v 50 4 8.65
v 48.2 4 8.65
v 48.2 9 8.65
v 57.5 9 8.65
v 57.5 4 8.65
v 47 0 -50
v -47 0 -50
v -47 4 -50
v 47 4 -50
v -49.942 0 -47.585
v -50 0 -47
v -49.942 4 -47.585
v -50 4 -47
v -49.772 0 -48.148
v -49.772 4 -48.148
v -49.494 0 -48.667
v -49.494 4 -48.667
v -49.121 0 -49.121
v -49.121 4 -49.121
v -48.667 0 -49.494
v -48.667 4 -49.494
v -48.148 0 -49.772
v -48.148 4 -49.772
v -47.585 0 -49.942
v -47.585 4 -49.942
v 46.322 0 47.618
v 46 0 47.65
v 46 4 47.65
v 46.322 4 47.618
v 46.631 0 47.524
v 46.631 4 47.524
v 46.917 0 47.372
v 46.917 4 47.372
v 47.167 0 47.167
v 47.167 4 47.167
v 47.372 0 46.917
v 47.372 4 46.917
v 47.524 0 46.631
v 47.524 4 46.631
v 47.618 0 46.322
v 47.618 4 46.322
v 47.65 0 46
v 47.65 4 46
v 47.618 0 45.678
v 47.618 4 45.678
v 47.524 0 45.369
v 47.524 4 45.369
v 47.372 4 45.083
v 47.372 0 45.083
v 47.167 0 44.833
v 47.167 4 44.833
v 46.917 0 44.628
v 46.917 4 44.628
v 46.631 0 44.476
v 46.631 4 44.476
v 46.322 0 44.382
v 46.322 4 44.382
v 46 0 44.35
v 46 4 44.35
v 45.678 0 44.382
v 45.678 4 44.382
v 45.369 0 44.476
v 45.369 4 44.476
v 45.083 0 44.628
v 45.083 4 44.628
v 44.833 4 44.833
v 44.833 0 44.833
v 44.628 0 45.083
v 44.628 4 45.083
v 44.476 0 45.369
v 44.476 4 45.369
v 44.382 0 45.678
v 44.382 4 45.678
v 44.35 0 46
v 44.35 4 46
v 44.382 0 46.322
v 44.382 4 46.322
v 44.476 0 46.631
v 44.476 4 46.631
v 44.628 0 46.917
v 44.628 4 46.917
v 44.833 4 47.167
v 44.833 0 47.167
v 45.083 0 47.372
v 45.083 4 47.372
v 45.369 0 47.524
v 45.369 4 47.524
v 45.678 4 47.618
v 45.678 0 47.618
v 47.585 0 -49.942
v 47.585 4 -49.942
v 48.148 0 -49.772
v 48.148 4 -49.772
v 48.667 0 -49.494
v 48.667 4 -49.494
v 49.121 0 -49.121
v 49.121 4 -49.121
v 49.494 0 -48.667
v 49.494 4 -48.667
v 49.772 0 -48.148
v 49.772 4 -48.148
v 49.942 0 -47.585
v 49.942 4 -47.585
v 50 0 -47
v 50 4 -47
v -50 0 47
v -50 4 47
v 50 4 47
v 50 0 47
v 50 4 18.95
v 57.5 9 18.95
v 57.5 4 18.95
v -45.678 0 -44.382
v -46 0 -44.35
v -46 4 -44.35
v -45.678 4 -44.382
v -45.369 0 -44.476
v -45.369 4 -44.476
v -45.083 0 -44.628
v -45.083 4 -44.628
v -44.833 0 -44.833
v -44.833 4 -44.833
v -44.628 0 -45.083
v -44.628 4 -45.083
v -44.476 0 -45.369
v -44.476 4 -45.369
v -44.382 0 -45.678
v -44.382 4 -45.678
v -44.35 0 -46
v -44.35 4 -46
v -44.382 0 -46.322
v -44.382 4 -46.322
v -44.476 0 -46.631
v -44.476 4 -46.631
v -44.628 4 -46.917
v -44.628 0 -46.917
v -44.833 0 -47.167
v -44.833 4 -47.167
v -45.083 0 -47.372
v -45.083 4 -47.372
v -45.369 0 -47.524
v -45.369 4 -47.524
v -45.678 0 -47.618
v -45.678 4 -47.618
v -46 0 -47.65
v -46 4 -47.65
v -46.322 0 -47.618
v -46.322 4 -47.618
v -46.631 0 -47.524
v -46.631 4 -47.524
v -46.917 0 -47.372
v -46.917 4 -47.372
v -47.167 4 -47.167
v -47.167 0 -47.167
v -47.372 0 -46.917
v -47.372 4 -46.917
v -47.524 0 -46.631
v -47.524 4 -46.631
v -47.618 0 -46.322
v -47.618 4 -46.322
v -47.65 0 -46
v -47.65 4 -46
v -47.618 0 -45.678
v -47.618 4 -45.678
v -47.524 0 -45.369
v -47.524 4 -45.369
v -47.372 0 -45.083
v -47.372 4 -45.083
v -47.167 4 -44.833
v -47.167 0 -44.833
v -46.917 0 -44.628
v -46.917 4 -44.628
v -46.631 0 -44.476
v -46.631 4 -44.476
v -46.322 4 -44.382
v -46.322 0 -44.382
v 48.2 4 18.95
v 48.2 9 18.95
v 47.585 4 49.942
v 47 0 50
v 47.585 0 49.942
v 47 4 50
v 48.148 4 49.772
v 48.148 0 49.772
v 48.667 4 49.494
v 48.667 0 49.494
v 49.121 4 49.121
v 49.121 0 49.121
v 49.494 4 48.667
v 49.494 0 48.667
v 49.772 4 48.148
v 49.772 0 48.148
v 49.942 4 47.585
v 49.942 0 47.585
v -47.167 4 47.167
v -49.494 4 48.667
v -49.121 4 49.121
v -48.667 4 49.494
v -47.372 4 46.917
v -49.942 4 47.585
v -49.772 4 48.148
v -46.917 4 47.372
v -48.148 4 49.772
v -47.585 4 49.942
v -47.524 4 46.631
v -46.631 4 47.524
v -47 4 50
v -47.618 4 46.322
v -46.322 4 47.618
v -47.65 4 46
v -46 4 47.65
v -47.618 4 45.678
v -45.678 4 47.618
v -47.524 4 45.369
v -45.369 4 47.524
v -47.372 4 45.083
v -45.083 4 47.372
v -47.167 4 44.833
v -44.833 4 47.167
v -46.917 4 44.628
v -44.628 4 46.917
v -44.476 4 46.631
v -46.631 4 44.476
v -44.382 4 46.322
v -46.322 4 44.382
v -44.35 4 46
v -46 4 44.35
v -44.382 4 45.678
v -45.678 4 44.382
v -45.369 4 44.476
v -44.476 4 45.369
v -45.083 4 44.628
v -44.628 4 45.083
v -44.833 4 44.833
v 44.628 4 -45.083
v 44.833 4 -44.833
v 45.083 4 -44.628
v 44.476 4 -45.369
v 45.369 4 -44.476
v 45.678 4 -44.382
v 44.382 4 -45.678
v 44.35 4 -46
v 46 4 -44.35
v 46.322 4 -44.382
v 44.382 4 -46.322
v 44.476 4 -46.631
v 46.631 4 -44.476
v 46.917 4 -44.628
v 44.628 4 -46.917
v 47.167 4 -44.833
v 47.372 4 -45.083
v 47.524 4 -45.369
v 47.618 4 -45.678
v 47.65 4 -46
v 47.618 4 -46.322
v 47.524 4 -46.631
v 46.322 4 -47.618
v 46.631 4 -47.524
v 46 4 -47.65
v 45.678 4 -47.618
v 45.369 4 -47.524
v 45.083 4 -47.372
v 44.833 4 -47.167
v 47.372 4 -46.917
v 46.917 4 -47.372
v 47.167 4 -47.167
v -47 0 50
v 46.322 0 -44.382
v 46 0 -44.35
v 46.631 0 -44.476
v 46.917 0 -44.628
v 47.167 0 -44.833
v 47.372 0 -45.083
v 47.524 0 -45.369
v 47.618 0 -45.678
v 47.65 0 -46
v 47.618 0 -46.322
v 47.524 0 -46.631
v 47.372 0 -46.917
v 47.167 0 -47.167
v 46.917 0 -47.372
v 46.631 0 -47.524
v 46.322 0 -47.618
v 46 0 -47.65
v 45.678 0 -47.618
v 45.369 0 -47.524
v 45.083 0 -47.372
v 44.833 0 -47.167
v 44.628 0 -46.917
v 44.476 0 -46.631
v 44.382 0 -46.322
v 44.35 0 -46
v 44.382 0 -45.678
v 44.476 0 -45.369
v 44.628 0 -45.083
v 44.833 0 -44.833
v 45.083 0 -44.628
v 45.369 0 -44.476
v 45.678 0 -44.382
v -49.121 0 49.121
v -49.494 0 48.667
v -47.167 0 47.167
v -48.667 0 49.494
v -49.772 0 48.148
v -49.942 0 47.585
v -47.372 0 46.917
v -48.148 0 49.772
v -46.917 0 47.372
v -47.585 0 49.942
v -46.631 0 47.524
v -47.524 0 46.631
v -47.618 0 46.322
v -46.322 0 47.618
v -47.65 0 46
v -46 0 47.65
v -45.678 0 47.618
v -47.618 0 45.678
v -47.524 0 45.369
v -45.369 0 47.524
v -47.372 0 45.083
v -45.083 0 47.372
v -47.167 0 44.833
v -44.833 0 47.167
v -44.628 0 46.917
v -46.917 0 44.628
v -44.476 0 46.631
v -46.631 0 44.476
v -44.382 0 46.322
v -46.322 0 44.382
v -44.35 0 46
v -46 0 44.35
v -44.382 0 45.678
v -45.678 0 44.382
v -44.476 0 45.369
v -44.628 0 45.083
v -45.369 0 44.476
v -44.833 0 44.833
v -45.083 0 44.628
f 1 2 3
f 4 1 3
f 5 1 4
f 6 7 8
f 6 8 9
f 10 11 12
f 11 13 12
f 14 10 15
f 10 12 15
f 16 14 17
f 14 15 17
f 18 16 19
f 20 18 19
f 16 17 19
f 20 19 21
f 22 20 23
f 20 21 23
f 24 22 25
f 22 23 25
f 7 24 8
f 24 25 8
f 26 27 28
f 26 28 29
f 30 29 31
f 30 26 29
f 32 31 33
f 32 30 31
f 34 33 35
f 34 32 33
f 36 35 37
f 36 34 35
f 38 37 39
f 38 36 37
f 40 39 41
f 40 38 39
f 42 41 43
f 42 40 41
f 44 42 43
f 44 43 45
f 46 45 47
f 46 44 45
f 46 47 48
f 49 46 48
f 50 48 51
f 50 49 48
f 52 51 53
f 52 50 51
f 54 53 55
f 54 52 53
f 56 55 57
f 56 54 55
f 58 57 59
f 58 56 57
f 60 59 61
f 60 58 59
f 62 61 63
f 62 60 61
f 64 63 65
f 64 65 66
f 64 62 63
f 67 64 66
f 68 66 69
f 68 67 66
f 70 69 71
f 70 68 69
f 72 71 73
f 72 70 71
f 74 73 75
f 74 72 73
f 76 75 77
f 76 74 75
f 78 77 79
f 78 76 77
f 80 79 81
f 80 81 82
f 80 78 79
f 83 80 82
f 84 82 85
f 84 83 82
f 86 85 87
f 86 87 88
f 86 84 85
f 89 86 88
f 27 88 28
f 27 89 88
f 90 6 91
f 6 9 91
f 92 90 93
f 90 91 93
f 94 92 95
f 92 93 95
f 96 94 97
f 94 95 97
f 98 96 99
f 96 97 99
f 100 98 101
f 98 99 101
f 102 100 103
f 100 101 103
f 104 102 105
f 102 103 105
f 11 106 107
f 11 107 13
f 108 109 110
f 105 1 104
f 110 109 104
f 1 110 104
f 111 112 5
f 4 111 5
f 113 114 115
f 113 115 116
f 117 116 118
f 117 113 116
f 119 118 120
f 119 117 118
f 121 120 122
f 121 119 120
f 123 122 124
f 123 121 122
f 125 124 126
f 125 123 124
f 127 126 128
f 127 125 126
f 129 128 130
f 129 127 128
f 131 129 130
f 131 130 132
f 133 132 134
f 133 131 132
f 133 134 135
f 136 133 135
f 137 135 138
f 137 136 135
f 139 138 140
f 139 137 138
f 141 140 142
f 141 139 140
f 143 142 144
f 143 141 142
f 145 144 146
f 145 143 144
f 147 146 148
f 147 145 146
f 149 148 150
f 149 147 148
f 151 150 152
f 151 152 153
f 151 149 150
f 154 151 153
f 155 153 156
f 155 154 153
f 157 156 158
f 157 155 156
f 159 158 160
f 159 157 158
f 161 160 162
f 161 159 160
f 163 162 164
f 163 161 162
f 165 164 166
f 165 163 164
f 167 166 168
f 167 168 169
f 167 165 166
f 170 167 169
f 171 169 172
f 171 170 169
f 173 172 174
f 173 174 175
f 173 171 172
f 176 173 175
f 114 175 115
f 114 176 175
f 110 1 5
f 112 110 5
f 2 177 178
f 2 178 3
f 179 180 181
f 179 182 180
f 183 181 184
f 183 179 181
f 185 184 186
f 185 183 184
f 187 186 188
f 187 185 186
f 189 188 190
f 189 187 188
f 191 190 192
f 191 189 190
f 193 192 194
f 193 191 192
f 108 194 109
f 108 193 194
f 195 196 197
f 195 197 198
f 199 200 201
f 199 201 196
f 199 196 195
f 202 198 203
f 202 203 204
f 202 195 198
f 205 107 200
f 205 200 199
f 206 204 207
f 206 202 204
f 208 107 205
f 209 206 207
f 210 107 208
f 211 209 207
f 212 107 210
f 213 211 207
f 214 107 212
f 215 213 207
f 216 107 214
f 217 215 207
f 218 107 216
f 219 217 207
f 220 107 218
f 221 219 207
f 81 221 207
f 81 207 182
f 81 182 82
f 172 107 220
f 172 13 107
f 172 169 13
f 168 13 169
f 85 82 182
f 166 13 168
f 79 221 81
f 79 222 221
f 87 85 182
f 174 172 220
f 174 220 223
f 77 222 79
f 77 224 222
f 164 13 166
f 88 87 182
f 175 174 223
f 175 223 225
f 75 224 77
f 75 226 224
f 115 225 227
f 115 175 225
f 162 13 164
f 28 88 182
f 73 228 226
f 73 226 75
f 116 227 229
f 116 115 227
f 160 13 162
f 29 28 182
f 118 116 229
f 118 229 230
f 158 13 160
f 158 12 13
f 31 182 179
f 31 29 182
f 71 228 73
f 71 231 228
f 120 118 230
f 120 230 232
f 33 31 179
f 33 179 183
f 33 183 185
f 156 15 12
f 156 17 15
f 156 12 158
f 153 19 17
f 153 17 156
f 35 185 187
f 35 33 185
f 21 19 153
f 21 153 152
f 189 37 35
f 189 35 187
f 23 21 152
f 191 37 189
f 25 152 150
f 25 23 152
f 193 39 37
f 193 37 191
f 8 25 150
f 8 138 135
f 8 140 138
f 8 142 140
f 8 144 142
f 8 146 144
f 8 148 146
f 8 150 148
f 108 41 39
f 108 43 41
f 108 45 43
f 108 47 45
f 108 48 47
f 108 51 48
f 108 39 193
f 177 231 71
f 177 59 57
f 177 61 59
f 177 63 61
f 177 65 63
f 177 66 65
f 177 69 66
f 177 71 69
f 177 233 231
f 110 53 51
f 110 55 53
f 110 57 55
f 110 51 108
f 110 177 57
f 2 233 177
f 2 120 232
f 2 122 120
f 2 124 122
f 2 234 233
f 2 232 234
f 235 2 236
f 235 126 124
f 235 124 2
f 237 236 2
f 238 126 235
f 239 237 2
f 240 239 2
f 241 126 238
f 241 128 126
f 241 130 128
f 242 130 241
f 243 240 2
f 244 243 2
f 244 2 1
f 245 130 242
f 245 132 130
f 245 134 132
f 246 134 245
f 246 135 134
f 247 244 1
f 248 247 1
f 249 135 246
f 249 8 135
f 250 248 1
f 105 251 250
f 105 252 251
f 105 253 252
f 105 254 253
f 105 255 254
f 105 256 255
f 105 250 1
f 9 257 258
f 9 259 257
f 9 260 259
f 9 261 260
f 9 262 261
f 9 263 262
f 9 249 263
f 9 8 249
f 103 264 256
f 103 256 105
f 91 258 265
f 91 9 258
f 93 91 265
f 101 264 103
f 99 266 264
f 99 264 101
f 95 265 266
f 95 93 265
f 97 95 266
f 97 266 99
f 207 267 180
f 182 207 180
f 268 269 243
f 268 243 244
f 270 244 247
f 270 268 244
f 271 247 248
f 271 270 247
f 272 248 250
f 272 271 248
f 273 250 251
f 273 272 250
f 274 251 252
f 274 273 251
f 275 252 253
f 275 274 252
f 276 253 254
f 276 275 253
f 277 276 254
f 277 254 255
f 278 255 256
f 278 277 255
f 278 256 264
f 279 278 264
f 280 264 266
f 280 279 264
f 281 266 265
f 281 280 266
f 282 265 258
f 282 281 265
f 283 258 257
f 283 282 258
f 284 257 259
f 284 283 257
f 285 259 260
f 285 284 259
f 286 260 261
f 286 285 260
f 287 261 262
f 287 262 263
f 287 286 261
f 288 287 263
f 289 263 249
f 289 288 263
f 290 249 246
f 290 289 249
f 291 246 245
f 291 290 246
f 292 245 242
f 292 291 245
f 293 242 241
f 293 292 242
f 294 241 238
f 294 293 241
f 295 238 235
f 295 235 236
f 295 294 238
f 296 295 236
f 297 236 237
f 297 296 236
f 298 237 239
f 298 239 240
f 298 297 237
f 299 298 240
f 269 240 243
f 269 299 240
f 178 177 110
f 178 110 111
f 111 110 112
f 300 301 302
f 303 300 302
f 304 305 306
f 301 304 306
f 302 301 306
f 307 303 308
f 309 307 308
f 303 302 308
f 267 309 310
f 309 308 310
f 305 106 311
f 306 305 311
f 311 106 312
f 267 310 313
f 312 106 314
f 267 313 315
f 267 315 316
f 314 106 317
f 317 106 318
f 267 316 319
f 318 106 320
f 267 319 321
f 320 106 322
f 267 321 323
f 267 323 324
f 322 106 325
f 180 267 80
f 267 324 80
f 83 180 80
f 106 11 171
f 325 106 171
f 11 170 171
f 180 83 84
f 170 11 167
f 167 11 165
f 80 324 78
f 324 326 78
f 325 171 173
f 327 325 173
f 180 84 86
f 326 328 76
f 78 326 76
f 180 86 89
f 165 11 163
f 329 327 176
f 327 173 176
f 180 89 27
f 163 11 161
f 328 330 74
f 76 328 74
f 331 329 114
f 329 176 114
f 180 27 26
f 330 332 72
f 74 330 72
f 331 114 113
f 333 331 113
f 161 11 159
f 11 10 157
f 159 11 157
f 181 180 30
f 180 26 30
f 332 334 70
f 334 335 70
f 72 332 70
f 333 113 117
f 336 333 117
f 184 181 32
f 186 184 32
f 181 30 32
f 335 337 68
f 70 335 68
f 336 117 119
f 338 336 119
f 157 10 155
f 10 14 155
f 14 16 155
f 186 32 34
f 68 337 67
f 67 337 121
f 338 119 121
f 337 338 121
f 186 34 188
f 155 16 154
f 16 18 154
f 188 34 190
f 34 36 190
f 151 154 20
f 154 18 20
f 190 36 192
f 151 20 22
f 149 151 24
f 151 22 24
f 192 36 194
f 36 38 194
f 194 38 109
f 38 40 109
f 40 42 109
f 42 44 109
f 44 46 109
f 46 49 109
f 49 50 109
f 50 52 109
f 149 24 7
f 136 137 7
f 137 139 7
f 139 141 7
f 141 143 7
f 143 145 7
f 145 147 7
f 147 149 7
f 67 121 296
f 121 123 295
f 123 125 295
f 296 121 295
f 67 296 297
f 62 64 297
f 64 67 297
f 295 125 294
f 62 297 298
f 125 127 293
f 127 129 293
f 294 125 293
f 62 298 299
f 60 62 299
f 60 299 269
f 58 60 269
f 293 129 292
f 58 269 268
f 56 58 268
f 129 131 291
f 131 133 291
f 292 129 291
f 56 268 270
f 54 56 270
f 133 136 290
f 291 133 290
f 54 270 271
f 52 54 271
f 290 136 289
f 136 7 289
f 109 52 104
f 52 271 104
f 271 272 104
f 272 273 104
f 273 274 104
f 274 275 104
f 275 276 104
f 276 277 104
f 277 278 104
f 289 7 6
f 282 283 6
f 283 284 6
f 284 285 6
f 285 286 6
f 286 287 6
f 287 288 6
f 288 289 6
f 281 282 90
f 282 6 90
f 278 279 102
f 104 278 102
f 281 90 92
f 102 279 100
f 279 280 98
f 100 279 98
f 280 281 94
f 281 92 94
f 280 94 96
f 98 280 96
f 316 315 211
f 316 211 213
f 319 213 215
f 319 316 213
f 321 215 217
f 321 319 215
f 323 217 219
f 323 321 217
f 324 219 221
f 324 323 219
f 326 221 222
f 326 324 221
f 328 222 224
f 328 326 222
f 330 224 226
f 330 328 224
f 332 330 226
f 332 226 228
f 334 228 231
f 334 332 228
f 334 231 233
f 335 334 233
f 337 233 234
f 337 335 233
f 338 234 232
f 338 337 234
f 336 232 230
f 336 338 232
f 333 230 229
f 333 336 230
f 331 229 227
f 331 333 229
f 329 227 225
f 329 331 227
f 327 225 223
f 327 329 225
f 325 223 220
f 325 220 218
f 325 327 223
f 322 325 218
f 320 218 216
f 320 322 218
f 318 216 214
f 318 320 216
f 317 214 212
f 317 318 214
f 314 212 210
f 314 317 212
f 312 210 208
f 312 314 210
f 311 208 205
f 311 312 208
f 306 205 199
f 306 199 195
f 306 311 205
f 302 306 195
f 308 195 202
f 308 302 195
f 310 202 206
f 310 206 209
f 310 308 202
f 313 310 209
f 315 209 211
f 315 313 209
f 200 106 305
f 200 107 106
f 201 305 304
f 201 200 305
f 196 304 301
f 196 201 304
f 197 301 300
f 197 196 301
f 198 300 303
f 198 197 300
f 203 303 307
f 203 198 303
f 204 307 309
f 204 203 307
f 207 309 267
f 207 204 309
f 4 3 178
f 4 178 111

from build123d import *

# Parameters (mm, degrees)
SKETCH_1_W      = 100
SKETCH_1_H      = 100
SKETCH_1_R      = 1.65
EXTRUDE_1_DEPTH = 4
FILLET_1_R      = 3
SKETCH_2_W      = 9.3
SKETCH_2_H      = 10.3
EXTRUDE_2_DEPTH = 5


with BuildPart() as part:
    # 草图1 → 凸台-拉伸1 (new body)
    with BuildSketch(Plane(origin=(0, 0, 0), x_dir=(1, 0, 0), z_dir=(0, 1, 0))):
        Rectangle(SKETCH_1_W, SKETCH_1_H)
        with Locations(Location((-46, 46, 0), (0, 0, 270))):
            Circle(SKETCH_1_R, mode=Mode.SUBTRACT)
        with Locations(Location((46, 46, 0), (0, 0, 270))):
            Circle(SKETCH_1_R, mode=Mode.SUBTRACT)
        with Locations(Location((46, -46, 0), (0, 0, 270))):
            Circle(SKETCH_1_R, mode=Mode.SUBTRACT)
        with Locations(Location((-46, -46, 0), (0, 0, 270))):
            Circle(SKETCH_1_R, mode=Mode.SUBTRACT)
    extrude(amount=EXTRUDE_1_DEPTH)

    # 圆角1
    fillet_1_edges = [part.edges().sort_by_distance(p)[0] for p in [
        (50, 2, 50),
        (-50, 2, 50),
        (-50, 2, -50),
        (50, 2, -50),
    ]]
    fillet(fillet_1_edges, radius=FILLET_1_R)

    # 草图2 → 凸台-拉伸2 (add)
    with BuildSketch(Plane(origin=(0, 4, 0), x_dir=(1, 0, 0), z_dir=(0, 1, 0))):
        with Locations((52.85, -13.8)):
            Rectangle(SKETCH_2_W, SKETCH_2_H)
    extrude(amount=EXTRUDE_2_DEPTH)


solid = part.part
